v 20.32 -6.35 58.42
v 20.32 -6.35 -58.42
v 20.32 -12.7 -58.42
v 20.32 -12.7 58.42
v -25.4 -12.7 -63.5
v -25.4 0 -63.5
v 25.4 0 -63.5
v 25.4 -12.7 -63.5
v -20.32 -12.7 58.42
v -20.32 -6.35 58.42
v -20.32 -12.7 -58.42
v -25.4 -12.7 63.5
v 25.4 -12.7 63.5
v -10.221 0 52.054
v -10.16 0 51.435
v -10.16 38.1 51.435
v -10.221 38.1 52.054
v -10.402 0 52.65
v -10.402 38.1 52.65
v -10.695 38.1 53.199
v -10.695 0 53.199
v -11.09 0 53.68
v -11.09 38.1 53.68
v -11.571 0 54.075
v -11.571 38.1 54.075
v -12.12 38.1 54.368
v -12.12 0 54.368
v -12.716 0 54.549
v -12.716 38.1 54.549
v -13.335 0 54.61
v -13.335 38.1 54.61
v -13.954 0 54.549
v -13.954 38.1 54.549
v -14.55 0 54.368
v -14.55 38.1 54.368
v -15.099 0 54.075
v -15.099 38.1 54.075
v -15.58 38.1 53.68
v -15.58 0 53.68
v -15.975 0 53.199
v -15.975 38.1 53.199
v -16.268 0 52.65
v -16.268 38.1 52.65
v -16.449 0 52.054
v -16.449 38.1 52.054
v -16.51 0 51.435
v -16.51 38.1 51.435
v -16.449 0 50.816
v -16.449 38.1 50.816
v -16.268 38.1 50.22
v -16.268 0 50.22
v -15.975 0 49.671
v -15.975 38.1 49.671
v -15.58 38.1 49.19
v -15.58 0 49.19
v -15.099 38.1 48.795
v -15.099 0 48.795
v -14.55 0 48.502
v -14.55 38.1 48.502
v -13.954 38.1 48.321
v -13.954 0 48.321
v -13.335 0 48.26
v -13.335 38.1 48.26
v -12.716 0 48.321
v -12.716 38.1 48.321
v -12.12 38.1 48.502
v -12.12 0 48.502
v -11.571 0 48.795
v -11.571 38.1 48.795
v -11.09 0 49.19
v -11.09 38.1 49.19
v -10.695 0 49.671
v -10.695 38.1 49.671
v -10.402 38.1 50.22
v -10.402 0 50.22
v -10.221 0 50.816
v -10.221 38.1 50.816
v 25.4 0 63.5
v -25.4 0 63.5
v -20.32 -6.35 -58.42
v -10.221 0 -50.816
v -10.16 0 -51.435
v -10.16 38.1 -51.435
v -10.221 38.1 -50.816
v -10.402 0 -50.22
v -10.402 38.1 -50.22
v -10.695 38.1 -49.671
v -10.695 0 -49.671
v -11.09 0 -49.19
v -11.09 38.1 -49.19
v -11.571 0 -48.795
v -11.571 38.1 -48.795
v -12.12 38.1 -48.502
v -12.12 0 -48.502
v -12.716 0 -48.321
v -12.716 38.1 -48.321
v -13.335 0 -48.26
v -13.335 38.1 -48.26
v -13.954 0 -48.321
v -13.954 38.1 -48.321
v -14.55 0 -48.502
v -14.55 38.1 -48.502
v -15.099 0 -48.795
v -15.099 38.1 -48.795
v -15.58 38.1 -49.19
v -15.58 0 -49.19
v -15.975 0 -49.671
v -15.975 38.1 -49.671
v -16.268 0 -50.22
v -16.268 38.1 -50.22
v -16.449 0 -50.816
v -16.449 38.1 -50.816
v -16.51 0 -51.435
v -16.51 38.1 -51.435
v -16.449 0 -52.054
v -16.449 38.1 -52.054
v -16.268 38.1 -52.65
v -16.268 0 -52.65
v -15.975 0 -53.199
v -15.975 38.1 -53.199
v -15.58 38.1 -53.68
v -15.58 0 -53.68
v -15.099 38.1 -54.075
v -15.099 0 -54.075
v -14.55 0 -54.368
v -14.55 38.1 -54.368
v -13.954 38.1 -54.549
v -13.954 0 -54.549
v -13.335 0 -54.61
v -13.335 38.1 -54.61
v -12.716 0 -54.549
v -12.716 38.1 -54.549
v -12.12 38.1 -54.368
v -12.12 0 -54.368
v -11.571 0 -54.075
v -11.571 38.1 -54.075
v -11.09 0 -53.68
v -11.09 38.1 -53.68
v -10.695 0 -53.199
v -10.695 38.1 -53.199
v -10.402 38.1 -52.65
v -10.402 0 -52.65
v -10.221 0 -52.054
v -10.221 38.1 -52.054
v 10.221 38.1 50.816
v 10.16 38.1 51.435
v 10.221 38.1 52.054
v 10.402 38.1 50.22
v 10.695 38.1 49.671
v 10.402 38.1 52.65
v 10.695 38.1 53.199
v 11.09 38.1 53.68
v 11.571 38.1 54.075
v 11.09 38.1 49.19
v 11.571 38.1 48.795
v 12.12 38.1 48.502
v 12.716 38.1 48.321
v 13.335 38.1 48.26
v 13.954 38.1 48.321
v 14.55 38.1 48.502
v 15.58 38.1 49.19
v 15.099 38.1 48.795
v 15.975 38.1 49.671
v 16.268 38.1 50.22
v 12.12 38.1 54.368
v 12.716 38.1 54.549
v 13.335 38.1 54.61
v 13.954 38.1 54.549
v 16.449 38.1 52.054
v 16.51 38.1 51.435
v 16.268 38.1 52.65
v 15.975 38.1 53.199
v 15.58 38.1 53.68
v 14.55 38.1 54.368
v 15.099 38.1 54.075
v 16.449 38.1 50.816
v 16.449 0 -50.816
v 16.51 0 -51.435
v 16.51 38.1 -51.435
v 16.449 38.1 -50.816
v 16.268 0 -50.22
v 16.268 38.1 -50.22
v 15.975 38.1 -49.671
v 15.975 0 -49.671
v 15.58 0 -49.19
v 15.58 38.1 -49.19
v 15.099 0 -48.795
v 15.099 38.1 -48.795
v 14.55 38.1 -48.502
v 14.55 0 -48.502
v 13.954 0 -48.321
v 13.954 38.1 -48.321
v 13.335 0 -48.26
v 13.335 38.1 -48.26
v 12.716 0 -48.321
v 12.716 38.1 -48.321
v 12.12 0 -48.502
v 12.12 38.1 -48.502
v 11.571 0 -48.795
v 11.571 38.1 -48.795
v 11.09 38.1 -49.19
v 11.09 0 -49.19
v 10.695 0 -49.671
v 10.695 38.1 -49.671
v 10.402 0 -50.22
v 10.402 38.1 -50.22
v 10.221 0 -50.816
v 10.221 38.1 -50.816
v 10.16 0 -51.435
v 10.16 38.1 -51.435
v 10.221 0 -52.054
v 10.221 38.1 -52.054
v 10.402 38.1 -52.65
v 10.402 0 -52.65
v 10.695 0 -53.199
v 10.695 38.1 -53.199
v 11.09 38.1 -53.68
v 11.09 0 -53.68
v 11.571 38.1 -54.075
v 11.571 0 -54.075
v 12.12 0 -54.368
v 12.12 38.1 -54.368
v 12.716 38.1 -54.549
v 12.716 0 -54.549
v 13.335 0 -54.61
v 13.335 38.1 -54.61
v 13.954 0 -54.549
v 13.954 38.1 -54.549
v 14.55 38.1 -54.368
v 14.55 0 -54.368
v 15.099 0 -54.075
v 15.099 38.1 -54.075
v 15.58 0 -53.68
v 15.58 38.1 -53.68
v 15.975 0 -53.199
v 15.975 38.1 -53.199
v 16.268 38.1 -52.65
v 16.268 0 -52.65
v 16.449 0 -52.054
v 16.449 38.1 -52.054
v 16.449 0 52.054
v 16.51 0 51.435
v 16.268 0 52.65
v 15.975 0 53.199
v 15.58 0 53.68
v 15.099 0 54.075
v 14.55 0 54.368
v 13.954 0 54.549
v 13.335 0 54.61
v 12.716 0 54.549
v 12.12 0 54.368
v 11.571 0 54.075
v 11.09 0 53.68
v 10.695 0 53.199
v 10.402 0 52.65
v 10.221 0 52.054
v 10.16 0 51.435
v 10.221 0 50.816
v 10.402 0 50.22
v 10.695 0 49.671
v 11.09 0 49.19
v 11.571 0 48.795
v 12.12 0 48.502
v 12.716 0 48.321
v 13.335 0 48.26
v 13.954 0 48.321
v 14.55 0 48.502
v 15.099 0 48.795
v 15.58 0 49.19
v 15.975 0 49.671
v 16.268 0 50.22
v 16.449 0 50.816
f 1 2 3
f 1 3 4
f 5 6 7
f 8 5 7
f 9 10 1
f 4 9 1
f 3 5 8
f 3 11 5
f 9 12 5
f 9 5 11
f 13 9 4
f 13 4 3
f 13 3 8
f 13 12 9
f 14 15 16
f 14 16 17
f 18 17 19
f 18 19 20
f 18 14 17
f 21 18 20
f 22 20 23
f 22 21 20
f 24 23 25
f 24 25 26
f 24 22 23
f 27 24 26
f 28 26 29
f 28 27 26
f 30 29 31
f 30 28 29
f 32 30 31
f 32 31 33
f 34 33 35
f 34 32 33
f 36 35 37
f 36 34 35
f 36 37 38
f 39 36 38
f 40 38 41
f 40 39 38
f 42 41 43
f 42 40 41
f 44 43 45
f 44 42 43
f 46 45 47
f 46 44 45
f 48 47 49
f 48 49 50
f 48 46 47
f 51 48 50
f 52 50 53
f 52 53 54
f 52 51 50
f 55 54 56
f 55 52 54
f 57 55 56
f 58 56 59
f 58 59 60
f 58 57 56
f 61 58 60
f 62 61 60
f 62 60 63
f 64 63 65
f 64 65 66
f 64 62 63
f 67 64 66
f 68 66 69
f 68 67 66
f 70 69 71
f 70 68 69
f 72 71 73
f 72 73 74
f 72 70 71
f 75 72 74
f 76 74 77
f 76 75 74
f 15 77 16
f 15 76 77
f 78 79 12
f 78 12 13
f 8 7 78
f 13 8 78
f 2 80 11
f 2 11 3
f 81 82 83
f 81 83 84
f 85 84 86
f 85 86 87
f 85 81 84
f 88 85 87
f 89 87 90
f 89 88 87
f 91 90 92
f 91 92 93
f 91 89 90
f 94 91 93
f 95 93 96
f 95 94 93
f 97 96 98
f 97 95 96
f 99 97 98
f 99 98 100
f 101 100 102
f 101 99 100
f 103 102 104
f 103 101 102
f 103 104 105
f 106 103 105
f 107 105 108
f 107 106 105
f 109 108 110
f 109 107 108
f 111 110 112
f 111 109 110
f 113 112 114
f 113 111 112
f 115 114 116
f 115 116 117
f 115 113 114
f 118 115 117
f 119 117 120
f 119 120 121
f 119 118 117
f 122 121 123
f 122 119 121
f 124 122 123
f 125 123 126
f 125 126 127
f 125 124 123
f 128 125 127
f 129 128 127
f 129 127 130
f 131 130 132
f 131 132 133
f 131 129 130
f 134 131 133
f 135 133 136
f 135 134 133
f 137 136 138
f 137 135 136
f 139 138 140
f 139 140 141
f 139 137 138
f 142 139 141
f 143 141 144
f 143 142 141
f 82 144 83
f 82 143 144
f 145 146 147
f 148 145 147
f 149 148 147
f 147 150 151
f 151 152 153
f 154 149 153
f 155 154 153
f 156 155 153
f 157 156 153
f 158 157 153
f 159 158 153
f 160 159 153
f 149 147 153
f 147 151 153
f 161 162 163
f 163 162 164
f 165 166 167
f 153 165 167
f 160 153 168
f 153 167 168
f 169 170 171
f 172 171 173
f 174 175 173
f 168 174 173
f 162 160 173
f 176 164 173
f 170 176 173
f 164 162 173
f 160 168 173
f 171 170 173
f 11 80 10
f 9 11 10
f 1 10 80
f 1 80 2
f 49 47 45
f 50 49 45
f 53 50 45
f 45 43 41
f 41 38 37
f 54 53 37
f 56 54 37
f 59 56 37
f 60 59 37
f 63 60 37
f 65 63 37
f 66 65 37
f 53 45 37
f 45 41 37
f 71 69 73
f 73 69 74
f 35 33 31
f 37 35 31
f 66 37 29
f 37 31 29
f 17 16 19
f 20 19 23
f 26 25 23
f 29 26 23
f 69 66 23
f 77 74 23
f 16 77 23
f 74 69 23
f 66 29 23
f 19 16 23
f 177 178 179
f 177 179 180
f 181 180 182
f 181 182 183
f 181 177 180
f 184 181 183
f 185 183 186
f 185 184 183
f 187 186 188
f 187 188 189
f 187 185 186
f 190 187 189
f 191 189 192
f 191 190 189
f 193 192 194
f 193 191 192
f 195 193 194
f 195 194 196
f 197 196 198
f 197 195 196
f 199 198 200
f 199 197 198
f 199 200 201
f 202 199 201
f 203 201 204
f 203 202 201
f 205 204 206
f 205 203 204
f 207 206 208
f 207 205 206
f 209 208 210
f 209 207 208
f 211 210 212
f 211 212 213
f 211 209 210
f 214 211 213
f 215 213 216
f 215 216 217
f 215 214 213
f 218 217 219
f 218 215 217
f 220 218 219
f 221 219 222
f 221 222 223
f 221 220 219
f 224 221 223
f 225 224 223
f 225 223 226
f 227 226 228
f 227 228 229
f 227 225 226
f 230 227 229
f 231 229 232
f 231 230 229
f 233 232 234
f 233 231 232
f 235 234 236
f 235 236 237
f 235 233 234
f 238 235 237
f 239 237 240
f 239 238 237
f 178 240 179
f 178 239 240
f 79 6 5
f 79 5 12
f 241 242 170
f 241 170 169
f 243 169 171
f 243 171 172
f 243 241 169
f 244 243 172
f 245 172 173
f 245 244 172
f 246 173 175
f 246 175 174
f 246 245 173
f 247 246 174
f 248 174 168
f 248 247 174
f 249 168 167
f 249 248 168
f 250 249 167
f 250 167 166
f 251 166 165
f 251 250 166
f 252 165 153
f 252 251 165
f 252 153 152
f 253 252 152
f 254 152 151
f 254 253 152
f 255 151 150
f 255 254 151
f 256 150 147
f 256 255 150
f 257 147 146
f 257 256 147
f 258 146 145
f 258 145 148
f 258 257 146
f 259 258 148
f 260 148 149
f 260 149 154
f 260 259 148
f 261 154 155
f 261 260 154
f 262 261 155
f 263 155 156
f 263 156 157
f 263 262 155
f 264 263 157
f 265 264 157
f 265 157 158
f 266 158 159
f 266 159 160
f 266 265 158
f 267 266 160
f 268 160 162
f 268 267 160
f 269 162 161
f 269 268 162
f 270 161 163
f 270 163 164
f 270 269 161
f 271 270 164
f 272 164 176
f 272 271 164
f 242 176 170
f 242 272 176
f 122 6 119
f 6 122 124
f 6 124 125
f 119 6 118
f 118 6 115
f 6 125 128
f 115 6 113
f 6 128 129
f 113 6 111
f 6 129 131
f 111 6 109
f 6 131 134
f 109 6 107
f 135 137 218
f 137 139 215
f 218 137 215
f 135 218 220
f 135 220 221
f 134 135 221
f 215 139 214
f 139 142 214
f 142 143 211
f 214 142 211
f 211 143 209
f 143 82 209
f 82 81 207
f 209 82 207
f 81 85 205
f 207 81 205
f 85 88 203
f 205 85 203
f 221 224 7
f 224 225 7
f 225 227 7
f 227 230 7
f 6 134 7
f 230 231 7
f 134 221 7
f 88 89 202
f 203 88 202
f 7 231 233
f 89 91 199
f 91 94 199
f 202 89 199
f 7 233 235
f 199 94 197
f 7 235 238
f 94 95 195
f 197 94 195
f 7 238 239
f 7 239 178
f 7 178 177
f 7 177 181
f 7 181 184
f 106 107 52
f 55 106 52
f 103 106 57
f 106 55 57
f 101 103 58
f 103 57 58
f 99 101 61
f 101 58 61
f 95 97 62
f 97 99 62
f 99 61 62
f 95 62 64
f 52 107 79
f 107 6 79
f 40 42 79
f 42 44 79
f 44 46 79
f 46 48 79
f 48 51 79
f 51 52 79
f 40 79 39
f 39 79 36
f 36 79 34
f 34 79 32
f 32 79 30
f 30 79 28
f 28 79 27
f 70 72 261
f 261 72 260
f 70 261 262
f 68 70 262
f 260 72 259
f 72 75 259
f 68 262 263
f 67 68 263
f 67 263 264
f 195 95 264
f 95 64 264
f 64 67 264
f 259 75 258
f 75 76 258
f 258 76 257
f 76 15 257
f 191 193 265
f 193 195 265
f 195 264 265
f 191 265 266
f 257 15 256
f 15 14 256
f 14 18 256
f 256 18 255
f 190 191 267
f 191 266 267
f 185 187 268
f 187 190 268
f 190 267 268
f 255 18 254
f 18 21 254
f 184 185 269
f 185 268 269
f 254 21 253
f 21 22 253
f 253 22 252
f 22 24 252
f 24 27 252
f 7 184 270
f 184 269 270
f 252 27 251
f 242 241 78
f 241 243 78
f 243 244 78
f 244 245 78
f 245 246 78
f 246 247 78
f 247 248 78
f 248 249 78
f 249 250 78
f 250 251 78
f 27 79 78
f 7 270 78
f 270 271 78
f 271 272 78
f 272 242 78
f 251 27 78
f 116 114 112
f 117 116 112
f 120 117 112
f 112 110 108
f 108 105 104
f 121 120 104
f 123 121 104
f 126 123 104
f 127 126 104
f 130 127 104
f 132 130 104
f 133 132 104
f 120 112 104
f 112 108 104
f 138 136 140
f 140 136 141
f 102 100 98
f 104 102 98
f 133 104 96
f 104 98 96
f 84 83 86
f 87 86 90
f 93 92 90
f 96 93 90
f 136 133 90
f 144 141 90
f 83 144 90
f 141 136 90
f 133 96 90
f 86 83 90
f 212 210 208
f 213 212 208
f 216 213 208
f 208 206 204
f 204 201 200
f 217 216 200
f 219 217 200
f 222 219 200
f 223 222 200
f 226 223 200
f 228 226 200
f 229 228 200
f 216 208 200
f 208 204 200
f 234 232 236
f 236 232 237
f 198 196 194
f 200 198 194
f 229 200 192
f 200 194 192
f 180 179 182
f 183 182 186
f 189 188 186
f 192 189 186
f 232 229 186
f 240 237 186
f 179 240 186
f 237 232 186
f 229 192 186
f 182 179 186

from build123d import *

# Parameters (mm, degrees)
F0_W     = 40.64
F0_H     = 116.84
F1_DEPTH = 6.35
F0_W_2   = 50.8
F0_H_2   = 127
F2_DEPTH = 12.7
F3_R     = 3.175
F4_DEPTH = 38.1


with BuildPart() as f1:
    # F0 (on Front) → F1 (new body)
    with BuildSketch(Plane.XZ):
        Rectangle(F0_W, F0_H)
    extrude(amount=F1_DEPTH)

    # F0 (on Front) → F2 (join)
    with BuildSketch(Plane.XZ):
        Rectangle(F0_W_2, F0_H_2)
        Rectangle(F0_W, F0_H, mode=Mode.SUBTRACT)
    extrude(amount=F2_DEPTH)

    # F3 (on face) → F4 (join)
    with BuildSketch(Plane.XZ):
        with Locations((-13.335, -51.435)):
            Circle(F3_R)
        with Locations((13.335, -51.435)):
            Circle(F3_R)
        with Locations((13.335, 51.435)):
            Circle(F3_R)
        with Locations((-13.335, 51.435)):
            Circle(F3_R)
    extrude(amount=-F4_DEPTH)


solid = f1.part
